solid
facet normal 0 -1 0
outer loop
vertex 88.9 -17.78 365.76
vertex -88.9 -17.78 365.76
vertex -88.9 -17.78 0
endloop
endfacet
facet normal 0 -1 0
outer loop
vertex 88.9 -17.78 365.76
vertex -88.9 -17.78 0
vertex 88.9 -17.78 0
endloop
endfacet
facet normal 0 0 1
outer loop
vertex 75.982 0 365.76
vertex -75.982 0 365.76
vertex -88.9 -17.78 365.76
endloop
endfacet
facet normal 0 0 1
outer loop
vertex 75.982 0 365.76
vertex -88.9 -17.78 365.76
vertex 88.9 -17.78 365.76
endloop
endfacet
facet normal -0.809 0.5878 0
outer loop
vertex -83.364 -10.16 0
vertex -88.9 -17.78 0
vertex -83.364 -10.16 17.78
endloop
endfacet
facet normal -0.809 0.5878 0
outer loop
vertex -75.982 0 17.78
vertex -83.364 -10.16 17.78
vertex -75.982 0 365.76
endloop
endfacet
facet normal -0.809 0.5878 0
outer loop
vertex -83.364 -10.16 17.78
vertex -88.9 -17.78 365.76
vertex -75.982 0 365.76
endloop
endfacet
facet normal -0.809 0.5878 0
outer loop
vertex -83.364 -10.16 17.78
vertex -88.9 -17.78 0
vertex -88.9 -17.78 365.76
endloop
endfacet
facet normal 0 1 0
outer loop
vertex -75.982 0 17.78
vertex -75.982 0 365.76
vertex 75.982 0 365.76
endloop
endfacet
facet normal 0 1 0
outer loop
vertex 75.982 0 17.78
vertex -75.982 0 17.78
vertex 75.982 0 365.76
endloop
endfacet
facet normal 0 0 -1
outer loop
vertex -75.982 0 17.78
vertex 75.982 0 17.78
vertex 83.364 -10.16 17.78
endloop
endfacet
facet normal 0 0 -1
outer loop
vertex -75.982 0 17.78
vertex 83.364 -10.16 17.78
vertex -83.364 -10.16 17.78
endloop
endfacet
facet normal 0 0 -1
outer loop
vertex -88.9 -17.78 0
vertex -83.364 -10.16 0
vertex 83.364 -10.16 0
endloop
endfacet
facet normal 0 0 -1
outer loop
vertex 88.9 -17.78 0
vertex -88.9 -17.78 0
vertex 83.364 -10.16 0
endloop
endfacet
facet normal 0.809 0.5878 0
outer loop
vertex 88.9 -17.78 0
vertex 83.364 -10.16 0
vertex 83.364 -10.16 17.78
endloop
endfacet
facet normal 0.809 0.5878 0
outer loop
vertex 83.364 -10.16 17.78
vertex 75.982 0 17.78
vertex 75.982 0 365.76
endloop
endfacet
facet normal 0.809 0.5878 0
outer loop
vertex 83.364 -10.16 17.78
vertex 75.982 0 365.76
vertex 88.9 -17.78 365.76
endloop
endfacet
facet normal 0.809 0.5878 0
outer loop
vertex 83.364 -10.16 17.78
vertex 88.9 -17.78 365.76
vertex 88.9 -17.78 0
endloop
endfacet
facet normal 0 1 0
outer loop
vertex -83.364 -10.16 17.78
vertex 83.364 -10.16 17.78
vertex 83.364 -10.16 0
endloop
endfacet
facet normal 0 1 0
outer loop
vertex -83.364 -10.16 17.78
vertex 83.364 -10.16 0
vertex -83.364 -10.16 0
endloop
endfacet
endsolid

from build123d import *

# Parameters (mm, degrees)
F0_W     = 177.8
F0_H     = 365.76
F1_DEPTH = 17.78
F2_W     = 177.8
F2_H     = 17.78
F3_DEPTH = 10.16
F5_DEPTH = 365.761


with BuildPart() as f1:
    # F0 (on Front) → F1 (new body)
    with BuildSketch(Plane.XZ):
        with Locations((0, 182.88)):
            Rectangle(F0_W, F0_H)
    extrude(amount=F1_DEPTH)

    # F2 (on face) → F3 (cut)
    with BuildSketch(Plane(origin=(0, 0, 0), x_dir=(-1, 0, 0), z_dir=(0, 1, 0))):
        with Locations((0, 8.89)):
            Rectangle(F2_W, F2_H)
    extrude(amount=-F3_DEPTH, mode=Mode.SUBTRACT)

    # F4 (on face) → F5 (cut, through all)
    with BuildSketch(Plane.XY.offset(365.76)):
        Polygon((-88.9, 0), (-88.9, -17.78), (-75.982074, 0), align=None)
        Polygon((75.982074, 0), (88.9, -17.78), (88.9, 0), align=None)
    extrude(amount=-F5_DEPTH, mode=Mode.SUBTRACT)


solid = f1.part
